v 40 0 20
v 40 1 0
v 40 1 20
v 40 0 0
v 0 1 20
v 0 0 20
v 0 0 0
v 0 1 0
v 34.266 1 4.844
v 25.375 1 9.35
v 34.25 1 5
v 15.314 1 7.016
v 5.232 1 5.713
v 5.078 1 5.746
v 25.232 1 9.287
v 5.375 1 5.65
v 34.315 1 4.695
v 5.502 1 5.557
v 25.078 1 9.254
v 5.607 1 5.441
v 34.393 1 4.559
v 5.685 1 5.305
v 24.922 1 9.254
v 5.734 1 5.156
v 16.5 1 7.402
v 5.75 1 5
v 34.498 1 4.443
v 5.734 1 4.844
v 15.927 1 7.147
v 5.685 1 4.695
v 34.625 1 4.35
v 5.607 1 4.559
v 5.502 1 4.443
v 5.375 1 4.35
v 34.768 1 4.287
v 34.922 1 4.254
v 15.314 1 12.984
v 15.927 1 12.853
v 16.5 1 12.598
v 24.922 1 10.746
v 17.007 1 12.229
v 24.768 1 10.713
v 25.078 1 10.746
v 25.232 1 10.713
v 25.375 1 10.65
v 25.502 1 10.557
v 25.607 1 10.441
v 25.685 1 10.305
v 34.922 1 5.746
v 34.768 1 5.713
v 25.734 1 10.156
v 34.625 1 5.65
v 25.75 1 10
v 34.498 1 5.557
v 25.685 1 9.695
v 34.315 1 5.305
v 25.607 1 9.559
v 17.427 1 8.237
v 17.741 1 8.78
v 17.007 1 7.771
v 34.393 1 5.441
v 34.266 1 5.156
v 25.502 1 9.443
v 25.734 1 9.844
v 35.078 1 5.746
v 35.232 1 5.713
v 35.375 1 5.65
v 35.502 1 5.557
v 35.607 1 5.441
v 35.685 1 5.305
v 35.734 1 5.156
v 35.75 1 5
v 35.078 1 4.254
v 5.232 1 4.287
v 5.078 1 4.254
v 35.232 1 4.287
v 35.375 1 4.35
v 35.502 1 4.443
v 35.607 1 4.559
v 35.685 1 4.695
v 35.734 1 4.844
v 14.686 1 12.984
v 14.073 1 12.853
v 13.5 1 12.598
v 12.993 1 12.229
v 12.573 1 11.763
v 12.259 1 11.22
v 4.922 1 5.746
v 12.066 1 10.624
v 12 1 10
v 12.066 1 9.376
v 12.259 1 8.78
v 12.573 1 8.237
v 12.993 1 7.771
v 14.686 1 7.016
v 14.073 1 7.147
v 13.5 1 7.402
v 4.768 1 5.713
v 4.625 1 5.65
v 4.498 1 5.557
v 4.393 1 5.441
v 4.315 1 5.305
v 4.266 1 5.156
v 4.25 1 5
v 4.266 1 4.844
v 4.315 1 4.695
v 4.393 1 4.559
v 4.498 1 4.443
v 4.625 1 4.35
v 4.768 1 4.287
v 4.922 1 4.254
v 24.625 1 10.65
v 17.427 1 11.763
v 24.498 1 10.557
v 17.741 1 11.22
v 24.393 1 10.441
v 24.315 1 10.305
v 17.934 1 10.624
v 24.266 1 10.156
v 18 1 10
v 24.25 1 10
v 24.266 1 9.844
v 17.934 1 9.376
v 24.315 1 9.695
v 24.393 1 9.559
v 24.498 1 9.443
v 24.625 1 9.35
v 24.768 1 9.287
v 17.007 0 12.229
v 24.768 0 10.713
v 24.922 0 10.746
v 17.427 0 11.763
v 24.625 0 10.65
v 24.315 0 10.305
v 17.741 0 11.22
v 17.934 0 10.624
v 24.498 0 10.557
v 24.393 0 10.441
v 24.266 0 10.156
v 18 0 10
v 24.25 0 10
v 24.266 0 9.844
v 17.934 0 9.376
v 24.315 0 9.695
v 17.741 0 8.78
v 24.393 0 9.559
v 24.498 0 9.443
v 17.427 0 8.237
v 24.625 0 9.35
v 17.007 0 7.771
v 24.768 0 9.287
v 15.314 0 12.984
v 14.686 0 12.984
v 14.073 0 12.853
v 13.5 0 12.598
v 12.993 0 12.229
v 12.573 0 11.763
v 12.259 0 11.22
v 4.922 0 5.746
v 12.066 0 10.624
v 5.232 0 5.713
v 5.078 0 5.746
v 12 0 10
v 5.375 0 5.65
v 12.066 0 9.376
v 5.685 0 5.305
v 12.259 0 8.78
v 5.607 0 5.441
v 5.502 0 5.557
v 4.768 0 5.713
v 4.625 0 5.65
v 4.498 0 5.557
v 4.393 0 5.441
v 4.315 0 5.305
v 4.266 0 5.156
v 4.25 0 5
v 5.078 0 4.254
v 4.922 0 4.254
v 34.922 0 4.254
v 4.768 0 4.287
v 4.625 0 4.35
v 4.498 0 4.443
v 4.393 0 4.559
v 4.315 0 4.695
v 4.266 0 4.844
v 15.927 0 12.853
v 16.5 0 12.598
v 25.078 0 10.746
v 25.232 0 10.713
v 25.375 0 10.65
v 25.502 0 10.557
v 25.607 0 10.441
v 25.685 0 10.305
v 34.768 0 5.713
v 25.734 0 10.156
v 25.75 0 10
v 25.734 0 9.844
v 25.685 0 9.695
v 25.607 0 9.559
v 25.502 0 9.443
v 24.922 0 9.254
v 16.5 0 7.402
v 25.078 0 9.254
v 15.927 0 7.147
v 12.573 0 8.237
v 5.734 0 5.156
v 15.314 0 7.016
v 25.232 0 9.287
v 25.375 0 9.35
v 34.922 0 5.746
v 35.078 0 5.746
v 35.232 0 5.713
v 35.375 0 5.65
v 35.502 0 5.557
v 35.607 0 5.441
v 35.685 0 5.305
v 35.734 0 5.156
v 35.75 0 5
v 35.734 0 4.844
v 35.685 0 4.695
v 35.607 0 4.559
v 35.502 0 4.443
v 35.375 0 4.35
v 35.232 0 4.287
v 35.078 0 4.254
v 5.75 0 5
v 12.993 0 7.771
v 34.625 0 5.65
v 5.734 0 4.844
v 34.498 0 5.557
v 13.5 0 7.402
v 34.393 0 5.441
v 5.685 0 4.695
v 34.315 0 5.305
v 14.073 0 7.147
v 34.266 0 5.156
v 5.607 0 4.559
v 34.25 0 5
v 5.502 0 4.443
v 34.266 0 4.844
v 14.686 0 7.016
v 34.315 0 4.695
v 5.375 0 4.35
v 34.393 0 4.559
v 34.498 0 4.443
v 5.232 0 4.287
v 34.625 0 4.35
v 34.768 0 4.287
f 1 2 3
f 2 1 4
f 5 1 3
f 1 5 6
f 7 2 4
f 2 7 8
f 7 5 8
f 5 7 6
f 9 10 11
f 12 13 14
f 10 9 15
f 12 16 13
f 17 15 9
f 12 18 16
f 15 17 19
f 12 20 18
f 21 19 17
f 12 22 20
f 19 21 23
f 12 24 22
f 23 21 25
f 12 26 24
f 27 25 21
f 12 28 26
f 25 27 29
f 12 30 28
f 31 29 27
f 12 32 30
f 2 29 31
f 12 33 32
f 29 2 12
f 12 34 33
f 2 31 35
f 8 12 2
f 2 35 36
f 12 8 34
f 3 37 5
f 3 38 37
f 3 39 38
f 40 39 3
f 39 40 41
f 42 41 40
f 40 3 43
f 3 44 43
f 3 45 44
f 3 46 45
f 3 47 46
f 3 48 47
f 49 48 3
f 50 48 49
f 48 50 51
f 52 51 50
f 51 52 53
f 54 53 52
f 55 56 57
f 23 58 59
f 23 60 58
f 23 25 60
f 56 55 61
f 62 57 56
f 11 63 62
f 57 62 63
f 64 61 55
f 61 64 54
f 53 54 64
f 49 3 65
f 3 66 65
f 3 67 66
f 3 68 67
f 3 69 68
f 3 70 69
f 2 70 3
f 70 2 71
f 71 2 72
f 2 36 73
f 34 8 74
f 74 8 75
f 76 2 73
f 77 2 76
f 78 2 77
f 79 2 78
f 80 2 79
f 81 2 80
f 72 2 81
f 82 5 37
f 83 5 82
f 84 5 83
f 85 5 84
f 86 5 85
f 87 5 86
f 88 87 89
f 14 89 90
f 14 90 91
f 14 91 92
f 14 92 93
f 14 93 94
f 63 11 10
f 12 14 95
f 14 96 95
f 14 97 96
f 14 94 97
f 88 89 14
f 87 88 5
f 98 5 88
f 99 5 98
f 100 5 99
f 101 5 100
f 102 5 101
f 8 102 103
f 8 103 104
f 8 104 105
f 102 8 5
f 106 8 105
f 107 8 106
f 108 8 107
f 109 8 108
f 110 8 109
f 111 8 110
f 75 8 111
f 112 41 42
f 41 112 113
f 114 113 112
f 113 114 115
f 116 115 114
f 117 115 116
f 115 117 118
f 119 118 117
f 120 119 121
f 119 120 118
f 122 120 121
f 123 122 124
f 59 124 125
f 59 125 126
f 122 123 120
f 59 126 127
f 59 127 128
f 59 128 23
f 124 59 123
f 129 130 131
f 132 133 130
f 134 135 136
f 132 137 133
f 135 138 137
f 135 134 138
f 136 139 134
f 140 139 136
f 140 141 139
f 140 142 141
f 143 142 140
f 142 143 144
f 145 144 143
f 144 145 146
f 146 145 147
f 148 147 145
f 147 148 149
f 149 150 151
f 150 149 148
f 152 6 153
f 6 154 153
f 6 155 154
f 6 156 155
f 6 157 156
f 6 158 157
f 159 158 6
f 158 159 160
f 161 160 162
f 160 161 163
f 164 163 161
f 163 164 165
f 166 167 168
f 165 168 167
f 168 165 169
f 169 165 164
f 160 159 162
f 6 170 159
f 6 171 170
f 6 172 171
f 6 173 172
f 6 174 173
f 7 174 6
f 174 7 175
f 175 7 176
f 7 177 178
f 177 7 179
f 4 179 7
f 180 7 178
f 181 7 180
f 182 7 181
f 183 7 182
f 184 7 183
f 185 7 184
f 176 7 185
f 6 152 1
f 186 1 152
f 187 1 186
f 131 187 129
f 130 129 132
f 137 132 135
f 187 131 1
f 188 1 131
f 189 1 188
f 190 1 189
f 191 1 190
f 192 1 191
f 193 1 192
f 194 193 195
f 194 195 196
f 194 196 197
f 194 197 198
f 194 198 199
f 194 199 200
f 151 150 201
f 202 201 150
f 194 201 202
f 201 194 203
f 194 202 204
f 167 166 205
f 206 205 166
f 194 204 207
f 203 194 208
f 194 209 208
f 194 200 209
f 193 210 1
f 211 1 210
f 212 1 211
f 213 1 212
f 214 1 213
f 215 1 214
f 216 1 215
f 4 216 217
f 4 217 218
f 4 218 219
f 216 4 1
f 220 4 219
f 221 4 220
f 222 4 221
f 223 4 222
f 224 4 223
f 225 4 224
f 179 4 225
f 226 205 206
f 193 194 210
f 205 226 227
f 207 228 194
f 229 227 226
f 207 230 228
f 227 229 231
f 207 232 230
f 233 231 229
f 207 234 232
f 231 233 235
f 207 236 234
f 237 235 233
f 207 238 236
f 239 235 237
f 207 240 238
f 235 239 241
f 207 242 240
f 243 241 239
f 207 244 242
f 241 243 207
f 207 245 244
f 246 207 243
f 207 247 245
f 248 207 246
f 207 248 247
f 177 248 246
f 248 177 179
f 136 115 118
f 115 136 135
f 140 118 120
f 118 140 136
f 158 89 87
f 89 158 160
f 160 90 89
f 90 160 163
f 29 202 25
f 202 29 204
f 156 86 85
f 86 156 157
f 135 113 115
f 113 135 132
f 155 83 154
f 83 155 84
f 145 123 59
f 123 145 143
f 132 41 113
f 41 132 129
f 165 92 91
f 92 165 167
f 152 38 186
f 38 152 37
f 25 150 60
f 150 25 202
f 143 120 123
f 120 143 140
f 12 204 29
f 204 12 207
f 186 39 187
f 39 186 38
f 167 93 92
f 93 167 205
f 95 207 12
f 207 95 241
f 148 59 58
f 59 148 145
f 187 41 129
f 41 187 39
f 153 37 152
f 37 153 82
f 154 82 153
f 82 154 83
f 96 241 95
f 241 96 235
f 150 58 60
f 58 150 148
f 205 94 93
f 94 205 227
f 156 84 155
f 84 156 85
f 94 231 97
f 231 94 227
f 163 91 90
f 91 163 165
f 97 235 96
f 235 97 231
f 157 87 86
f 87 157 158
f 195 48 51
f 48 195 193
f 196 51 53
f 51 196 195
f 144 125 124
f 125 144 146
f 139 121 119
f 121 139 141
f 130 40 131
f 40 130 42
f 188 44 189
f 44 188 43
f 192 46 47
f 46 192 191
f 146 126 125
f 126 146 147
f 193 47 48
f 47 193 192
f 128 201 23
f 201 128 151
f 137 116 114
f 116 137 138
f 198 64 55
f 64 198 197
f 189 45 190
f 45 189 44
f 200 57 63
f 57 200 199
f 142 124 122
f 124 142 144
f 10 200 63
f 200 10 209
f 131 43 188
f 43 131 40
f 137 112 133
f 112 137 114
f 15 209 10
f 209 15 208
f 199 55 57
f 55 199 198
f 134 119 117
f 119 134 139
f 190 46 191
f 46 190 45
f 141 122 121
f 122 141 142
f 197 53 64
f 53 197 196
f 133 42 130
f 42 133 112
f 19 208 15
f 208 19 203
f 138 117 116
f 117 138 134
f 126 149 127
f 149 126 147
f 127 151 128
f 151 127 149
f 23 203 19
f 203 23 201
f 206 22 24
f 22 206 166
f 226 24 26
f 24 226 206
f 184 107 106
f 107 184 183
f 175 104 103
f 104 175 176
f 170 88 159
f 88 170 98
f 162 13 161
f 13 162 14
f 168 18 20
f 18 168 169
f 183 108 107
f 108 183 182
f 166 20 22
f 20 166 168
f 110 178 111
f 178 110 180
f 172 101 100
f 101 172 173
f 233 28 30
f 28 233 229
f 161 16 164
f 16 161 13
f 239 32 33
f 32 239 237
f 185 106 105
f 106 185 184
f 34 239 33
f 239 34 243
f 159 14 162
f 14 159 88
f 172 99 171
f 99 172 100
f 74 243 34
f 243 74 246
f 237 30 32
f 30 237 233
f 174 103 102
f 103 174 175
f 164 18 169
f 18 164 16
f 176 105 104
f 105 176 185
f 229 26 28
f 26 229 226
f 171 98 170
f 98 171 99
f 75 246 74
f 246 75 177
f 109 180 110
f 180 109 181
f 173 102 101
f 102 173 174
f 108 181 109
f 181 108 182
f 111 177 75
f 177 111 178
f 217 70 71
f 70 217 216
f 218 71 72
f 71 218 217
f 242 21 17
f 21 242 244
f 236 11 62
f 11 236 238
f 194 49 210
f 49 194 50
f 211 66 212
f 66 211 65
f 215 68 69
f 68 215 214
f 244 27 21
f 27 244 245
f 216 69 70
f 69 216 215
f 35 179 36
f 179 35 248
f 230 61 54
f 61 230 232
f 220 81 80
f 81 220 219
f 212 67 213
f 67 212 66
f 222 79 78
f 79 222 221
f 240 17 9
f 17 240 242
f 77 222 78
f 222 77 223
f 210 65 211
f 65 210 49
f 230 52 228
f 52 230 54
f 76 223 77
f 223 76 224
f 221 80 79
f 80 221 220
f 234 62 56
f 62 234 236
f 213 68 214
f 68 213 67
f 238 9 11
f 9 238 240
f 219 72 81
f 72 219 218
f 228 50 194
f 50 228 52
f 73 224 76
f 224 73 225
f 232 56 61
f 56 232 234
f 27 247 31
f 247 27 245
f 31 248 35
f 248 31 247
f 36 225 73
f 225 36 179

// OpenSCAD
$fs=0.01;

module baseplate(){
difference(){
color("green")cube([40,1,20]);
    translate([15,2,10])
    rotate([90,0, 0])
        cylinder(h=5, r=3);
}
}


difference(){
    baseplate();
    translate([25,2,10])
    rotate([90,0, 0])
        cylinder(h=5, r=0.75);
    translate([5,2,5])
    rotate([90,0, 0])
        cylinder(h=5, r=0.75);
    translate([35,2,5])
    rotate([90,0, 0])
        cylinder(h=5, r=0.75);
}
